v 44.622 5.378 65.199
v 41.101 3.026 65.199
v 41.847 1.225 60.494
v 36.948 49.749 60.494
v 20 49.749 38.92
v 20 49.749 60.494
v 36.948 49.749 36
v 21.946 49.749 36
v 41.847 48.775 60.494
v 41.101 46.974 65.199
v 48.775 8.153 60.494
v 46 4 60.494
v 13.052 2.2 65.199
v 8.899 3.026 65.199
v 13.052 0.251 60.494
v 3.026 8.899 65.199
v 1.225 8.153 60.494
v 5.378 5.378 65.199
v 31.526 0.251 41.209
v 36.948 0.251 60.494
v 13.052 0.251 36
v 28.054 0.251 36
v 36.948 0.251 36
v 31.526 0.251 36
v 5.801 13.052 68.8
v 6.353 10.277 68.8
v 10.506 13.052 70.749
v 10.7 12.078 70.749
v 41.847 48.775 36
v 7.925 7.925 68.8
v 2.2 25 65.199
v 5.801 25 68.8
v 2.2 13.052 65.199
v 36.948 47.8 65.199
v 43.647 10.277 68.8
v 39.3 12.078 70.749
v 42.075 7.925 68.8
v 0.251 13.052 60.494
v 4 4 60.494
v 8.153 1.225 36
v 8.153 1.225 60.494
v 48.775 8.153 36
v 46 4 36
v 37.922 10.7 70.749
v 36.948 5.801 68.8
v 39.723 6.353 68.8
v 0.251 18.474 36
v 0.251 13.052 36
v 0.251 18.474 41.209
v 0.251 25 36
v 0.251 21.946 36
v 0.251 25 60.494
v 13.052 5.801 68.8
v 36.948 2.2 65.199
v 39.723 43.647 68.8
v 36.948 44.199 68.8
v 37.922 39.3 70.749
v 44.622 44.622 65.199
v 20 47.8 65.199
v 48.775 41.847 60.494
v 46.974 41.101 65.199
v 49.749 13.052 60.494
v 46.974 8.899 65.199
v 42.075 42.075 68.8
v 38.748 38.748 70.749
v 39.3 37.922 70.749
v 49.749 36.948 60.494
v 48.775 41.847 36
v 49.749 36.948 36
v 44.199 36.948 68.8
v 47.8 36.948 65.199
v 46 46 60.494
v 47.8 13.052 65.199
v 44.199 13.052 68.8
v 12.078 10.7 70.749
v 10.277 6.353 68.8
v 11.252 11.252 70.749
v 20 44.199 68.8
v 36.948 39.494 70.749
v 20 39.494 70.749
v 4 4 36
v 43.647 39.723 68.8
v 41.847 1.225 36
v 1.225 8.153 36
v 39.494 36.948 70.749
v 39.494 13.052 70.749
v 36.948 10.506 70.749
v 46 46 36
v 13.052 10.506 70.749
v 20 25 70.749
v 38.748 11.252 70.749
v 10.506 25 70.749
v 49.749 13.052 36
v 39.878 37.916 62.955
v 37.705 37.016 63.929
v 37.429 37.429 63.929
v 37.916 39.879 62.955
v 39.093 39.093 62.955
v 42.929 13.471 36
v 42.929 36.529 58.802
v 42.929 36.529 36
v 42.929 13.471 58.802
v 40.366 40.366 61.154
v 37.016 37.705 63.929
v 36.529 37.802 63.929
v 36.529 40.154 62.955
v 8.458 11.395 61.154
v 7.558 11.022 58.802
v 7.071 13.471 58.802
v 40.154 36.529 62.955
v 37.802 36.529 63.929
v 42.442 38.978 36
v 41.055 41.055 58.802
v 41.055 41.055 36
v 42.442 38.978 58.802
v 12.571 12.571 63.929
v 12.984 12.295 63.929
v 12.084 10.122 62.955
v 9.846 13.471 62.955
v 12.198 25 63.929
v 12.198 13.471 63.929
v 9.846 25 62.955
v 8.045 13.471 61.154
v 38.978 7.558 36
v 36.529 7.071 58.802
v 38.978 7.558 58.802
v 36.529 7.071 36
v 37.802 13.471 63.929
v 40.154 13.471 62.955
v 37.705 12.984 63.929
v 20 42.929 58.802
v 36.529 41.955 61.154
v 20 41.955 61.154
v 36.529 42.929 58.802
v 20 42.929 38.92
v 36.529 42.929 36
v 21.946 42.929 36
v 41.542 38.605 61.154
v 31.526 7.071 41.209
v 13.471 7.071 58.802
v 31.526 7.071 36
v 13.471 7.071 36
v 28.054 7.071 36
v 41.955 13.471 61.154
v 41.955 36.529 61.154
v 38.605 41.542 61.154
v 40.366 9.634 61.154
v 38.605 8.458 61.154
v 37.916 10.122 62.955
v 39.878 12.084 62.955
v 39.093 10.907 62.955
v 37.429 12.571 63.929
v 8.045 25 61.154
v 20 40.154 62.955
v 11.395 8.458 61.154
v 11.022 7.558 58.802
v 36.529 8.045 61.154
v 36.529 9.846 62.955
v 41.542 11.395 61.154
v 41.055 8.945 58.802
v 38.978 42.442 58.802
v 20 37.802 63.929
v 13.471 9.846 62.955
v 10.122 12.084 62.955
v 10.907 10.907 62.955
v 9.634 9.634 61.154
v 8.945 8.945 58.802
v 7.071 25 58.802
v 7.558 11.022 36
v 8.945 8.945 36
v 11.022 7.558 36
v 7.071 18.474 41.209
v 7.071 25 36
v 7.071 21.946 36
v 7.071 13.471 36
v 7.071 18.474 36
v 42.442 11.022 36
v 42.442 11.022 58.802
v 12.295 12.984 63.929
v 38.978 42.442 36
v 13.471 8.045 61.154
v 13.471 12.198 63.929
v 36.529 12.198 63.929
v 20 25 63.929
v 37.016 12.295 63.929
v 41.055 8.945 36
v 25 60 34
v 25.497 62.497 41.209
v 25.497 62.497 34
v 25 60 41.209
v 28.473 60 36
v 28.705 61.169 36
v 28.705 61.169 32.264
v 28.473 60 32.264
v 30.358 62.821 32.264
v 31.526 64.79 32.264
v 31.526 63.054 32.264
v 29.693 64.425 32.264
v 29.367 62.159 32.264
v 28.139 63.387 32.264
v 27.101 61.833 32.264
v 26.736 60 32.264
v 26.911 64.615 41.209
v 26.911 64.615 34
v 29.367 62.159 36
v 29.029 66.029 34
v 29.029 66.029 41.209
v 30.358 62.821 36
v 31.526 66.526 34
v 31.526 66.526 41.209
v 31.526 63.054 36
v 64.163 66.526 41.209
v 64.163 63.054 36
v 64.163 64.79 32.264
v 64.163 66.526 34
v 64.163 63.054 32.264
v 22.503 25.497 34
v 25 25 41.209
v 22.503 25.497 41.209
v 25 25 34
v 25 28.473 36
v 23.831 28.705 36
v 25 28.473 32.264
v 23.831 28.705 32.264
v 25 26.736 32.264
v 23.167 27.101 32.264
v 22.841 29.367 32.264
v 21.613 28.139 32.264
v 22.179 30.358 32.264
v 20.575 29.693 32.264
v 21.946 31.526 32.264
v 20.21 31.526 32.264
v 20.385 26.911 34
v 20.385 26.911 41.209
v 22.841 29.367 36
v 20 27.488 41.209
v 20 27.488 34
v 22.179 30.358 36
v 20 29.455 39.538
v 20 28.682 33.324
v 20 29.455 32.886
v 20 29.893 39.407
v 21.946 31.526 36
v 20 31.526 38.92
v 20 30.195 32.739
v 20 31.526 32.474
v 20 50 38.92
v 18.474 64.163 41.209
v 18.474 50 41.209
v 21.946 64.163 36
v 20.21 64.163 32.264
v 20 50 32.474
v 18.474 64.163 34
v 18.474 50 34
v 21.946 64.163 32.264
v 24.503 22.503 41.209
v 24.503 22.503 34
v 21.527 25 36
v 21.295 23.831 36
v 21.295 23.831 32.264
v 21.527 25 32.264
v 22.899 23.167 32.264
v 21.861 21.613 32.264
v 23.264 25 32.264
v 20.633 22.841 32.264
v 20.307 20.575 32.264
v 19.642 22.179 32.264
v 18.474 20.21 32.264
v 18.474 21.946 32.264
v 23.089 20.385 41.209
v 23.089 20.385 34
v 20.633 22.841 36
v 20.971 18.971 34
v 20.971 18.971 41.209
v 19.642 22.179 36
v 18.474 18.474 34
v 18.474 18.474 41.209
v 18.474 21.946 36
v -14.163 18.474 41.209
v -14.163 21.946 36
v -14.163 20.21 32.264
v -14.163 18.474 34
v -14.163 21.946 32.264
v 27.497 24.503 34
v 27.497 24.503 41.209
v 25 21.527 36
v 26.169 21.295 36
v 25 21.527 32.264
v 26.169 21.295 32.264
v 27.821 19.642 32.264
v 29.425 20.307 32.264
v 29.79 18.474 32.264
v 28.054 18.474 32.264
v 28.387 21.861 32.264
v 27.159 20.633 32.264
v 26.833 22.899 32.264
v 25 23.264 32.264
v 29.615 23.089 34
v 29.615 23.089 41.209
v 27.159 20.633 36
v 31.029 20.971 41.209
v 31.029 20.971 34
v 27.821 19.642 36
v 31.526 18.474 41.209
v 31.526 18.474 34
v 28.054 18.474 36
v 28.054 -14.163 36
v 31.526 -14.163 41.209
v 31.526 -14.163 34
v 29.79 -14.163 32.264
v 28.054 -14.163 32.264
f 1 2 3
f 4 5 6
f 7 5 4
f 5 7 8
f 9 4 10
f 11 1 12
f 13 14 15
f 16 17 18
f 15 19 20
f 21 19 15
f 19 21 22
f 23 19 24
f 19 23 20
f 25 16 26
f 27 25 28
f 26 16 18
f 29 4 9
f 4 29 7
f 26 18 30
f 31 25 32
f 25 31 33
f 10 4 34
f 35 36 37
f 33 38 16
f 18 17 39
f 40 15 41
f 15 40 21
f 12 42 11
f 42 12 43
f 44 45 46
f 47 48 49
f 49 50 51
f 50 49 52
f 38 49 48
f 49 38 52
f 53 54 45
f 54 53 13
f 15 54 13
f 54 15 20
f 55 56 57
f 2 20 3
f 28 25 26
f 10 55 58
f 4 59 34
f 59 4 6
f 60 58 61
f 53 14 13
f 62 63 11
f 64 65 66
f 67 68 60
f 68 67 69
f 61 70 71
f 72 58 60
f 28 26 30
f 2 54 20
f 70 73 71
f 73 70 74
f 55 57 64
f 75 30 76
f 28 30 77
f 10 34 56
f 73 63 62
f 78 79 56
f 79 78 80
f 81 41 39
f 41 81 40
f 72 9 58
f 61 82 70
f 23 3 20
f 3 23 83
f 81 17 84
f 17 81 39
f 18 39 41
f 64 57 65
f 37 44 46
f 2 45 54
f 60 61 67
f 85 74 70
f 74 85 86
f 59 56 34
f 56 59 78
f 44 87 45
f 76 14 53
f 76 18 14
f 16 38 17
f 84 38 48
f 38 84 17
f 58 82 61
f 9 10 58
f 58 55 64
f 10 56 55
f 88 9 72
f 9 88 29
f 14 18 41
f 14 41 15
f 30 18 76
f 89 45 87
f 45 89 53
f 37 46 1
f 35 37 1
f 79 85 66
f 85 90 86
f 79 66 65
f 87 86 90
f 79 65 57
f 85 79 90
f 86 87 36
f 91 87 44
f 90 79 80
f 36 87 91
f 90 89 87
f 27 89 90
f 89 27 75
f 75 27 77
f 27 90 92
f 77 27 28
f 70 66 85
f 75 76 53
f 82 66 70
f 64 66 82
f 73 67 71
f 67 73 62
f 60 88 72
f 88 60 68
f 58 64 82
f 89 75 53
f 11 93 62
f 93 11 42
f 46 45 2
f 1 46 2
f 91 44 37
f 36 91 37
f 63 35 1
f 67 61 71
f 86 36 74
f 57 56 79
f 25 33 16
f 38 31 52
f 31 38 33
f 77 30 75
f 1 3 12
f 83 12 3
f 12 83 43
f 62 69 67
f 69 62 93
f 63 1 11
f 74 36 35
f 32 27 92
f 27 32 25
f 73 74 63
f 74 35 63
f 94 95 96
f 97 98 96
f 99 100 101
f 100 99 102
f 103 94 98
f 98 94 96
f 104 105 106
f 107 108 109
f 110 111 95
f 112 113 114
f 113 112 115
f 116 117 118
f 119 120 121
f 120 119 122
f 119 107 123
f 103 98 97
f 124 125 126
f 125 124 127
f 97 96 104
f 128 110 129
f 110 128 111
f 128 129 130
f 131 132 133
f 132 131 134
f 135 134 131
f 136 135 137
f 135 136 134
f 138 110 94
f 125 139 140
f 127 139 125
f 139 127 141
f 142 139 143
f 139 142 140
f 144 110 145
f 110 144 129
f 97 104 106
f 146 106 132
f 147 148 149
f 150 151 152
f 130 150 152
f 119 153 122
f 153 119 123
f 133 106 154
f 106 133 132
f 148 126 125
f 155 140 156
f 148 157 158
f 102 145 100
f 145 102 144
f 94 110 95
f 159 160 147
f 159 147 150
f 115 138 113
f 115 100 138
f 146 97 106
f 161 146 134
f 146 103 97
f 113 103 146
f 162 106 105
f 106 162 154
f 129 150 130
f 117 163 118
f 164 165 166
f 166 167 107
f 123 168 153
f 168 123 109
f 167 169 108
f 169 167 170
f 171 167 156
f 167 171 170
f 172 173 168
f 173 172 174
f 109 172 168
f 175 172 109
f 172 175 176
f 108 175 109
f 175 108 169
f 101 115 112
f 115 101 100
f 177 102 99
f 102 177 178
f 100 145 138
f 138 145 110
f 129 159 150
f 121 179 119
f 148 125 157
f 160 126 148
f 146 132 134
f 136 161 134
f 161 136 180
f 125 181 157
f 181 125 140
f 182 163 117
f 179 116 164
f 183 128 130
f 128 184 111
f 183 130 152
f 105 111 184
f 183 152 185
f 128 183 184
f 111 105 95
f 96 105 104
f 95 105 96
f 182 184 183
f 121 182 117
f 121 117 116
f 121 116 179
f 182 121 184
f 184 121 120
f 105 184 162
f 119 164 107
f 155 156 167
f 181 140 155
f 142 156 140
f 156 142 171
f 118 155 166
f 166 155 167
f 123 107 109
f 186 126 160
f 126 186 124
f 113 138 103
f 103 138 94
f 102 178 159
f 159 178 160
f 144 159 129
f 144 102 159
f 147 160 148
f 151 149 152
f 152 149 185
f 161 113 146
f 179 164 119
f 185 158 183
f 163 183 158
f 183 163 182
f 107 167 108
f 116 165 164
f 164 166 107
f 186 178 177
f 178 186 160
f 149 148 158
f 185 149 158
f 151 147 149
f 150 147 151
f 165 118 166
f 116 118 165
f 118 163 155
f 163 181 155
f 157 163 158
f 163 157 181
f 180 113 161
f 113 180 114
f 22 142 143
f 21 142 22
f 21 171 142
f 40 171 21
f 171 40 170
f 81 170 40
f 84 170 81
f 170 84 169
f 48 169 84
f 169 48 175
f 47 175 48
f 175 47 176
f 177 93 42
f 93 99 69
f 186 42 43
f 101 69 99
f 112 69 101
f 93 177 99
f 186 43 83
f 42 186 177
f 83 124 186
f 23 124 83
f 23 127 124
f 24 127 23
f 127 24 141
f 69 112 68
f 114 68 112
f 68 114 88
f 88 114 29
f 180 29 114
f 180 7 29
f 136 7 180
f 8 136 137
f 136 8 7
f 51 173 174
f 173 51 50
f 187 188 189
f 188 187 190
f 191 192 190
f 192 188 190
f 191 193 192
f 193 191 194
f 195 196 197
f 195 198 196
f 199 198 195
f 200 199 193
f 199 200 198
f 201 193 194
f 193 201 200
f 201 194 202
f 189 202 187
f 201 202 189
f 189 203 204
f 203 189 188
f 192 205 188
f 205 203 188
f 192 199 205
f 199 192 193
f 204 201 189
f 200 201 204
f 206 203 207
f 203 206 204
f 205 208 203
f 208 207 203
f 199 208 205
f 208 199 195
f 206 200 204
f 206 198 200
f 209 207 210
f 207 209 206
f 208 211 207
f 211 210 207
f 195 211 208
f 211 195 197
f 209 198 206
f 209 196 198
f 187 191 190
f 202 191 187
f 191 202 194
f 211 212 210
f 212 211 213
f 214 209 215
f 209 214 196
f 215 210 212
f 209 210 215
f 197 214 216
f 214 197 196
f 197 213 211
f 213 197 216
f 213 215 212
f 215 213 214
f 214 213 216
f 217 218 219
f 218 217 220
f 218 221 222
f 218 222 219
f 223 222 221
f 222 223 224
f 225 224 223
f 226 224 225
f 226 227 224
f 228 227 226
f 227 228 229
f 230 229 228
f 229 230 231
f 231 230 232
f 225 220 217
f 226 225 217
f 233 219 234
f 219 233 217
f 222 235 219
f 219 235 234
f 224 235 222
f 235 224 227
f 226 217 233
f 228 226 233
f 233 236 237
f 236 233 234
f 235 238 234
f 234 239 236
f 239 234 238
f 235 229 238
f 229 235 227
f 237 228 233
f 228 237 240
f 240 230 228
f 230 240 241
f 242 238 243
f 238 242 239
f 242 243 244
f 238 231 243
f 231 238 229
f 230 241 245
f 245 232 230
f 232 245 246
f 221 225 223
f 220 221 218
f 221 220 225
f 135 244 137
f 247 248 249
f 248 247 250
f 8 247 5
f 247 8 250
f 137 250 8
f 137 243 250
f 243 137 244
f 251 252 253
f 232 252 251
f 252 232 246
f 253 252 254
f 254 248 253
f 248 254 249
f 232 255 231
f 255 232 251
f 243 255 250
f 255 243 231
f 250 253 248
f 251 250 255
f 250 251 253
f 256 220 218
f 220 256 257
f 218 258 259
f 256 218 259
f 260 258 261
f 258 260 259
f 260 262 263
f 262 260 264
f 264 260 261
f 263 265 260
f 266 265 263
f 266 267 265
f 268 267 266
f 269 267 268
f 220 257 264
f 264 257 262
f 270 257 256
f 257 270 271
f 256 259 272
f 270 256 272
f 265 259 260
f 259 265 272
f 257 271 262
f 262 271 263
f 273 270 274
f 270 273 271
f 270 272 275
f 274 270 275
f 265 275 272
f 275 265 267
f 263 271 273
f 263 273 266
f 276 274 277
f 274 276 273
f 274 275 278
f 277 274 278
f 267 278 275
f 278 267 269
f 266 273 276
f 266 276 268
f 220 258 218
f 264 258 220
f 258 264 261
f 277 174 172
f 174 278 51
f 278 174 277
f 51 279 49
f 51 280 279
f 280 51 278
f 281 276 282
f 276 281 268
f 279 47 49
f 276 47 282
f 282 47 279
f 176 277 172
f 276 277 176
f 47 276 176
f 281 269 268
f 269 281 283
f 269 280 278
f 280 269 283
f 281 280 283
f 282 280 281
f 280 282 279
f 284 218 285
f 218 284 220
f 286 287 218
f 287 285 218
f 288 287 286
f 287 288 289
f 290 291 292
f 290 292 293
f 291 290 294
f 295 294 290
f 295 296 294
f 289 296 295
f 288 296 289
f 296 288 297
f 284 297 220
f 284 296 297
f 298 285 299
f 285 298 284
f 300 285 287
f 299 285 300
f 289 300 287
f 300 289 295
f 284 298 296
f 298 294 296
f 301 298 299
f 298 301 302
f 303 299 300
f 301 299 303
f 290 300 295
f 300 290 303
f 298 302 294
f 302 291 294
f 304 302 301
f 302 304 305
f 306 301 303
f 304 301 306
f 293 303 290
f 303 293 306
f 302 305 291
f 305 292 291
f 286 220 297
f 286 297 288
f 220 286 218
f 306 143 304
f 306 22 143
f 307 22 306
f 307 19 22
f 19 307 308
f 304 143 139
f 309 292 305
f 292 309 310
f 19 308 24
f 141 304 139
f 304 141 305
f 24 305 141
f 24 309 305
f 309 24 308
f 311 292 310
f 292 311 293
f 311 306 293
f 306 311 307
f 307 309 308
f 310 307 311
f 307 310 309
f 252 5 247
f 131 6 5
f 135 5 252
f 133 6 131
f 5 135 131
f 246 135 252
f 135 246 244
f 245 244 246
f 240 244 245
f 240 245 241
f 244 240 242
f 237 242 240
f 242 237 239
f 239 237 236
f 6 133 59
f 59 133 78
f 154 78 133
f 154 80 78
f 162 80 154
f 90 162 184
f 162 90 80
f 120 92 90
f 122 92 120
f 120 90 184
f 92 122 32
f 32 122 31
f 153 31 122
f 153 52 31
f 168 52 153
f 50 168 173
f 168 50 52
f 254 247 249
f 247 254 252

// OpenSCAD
debug = false;
$fn = 16; // Edge faces
$radius = rands(1,16,1)[0]; // Radius of edge curves
$thick = rands(1,8,1)[0]; // Thickness of parts
$insert_height = 0.500; // 20% will be lid/insert, 80% receiver  -- Safe range: 0.3 to 0.75 or so?
$abs_min = 1; // absolute minimum width for any piece
$lip_height = 2; // How deep the friction-fit part of the lip should be
$friction_rub = 0.1; 

// Receiver = "bottom", Insert = "top" with lip
receiver_size = [50,50,70];
//receiver_size = rands(20,100,3);

echo("[[[[ ", $radius, " ||||", $thick, " ]]]]");

display_skew = 1.0; // How many mm apart we hold the box and lid when displaying it or for printing
$print_mode = false;

// ######### Computed values 
// lip_width is how deep the lip can be 
$lip_width = ($thick/2 <= $abs_min*2) ? $abs_min*2 : $thick / 2;
// Ratio between the radius of the inside surface vs. the outside surface of the box
pinch = ($radius-$thick) > ($radius / 2) ? ($radius-$thick) : ($radius / 2);


insert_size = [receiver_size[0], receiver_size[1], receiver_size[2]*$insert_height];
// When we make lip corners this is how far in/out we move the profile to get a correct inside curve
radius_width_padding = $radius - $thick - $lip_width; 
lip_corner_width = radius_width_padding + $thick;

echo("lip_width=",$lip_width);
echo("lip_corner_width=",lip_corner_width);
echo("pinch=",pinch);

difference() { // DEBUG
    // join top and bottom for display
    union() { 
        // OPTIONAL - cut out the lip profile from the receiver for a good friction fit or debug the fit
        *difference() {
            makeReceiver(receiver_size); 
            translate([0,receiver_size[1],receiver_size[2]*(1-$insert_height)+(receiver_size[2]*$insert_height)]) 
                rotate([180,0,0])
                    makeInsert(insert_size);
        }
        if( ! $print_mode) { // Put the lid just over the box, display_skew above where it should be
            translate([0,receiver_size[1],receiver_size[2]*(1-$insert_height)+(receiver_size[2]*$insert_height)+display_skew])
                rotate([180,0,0])    
                    makeInsert(insert_size);
        } else { // Put the lid on the print bed display_skew from the other part
            translate([0,receiver_size[1]+display_skew,0])
                rotate([0,0,0])
                    makeInsert(insert_size);
        }
    }
    *translate([0,receiver_size[1]/2,0]) cube(125,25,25); // DEBUG 
}
///////////////////////////////////////////////////////////////////////////////
module makeReceiver(size) {
    difference() {
        roundedBox(size, $radius, $thick);
        translate([0,0,size[2]*(1-$insert_height)])
            cube(size+[1,1,1]); // cut off top of box for lid fit
    }    
}

module makeInsert(size) {
    difference() { // DEBUG
        union() {
            echo("radius|thick|z", size, $radius, $thick, $insert_height);
            difference() { // Build the base box half
                roundedBox(receiver_size); 
                translate([0,0,size[2]])
                    cube(size+[1,1,size[2]]); // cut off the top of the box
            }
            color("red")
                // position the lip inside the insert
                translate([size[0]/2,size[1]/2,(size[2]+$thick+$lip_height)])
                    rotate([180,0,0])            
                        makeLip(size);
            
        }
        cube([20,25,70]); // DEBUG
    }
}
module makeLip(size) {
    //size = lipSize-[$lip_width*2,$lip_width*2,0]; // the lip needs to be slightly smaller so it's flush with the inside
    union() {  echo("Size=",size);
        translate([0,size[2],0])
            lipEdgeAndCorner(size, 0);
        translate([0,0,0])
            rotate([0,0,90])
                lipEdgeAndCorner(size, 1);
        translate([0,0,0])
            rotate([0,0,180])
                lipEdgeAndCorner(size, 1);
        translate([0,0,0])
            rotate([0,0,270])
                lipEdgeAndCorner(size, 1);

    }
}
module lipEdgeAndCorner(size, q) {
    render() {
       union() {
            translate([pinch,0,$thick]) //TODO
            {
                difference() {
                    // Rotate the profile around to create a corner
                    rotate_extrude()
                        lipProfileCorner();
                    // slice off the sections of the curve we don't need
                    bound = $radius+$lip_width+$thick; // for cutting off pieces we don't need, make a larger box
                    translate([0,-bound,-bound])
                        cube([bound*2,bound*2,bound*2]); 
                    translate([-bound,-bound,-bound])
                        cube([bound*2,bound,bound*2]);
                }            
            }
            $setback = ($thick*2)+$lip_width;
            if(q % 2 == 0) { 
                translate([pinch,0,0])
                    rotate([90,0,90]) // Straight Edge 1 (X)
                        linear_extrude(height = size[0]-$setback, convexity = 1)
                            translate([0,$thick,0])
                                lipProfileStraight();
            } else {
                translate([pinch,0,0])
                    rotate([90,0,90]) // Straight Edge 2 (Y)
                        linear_extrude(height = size[1]-$setback, convexity = 1)
                            translate([0,$thick,0]) 
                                lipProfileStraight();
            }
        
        }
    }
}
module lipProfileCorner() {
    difference()
    {
        lipProfileStraight();
        
        bound = pinch; // just bigger than our biggest dimension, we clip off anything in negative X so we can rotate_extrude
        polygon(points=[[0,0],[0,-bound],[-bound,-bound],[-bound,bound],[0,bound]]);
    }   
}
module lipProfileStraight() {
    w = $lip_width/2;
    difference()
    {
        translate([pinch,-w,0])
            mirror() // flips the lip edge around so the profile is correct
                polygon(points=[[w,0],[w*2,0],[w*2,w+$lip_height],[0,w*4+$lip_height],[0,w]]); // gives us a 45 degree angle on the back side support
        
       bound = (w*4)+$lip_height+1; // just bigger than our biggest dimension, we clip off anything in negative X so we can rotate_extrude
       polygon(points=[[0,0],[0,-bound],[-bound,-bound],[-bound,bound],[0,bound]]);
    }
}
module roundedBox(size) {
    difference() { 
        roundedCube(size, $radius);
        translate([$thick,$thick,$thick])
            roundedCube(size-[$thick*2, $thick*2, $thick*2], pinch);
    }
}
module roundedCube(size, r) {
    echo ("R =",r);
    hull() { // 8 spheres in the corners, made into a hull
        x = size[0]-r;
        y = size[1]-r;
        z = size[2]-r;
        translate([r,r,r]) sphere(r);
        translate([x,r,r]) sphere(r);
        translate([r,y,r]) sphere(r);
        translate([x,y,r]) sphere(r);
        translate([r,y,z]) sphere(r);
        translate([r,r,z]) sphere(r);
        translate([x,r,z]) sphere(r);
        translate([x,y,z]) sphere(r);
    }
}
